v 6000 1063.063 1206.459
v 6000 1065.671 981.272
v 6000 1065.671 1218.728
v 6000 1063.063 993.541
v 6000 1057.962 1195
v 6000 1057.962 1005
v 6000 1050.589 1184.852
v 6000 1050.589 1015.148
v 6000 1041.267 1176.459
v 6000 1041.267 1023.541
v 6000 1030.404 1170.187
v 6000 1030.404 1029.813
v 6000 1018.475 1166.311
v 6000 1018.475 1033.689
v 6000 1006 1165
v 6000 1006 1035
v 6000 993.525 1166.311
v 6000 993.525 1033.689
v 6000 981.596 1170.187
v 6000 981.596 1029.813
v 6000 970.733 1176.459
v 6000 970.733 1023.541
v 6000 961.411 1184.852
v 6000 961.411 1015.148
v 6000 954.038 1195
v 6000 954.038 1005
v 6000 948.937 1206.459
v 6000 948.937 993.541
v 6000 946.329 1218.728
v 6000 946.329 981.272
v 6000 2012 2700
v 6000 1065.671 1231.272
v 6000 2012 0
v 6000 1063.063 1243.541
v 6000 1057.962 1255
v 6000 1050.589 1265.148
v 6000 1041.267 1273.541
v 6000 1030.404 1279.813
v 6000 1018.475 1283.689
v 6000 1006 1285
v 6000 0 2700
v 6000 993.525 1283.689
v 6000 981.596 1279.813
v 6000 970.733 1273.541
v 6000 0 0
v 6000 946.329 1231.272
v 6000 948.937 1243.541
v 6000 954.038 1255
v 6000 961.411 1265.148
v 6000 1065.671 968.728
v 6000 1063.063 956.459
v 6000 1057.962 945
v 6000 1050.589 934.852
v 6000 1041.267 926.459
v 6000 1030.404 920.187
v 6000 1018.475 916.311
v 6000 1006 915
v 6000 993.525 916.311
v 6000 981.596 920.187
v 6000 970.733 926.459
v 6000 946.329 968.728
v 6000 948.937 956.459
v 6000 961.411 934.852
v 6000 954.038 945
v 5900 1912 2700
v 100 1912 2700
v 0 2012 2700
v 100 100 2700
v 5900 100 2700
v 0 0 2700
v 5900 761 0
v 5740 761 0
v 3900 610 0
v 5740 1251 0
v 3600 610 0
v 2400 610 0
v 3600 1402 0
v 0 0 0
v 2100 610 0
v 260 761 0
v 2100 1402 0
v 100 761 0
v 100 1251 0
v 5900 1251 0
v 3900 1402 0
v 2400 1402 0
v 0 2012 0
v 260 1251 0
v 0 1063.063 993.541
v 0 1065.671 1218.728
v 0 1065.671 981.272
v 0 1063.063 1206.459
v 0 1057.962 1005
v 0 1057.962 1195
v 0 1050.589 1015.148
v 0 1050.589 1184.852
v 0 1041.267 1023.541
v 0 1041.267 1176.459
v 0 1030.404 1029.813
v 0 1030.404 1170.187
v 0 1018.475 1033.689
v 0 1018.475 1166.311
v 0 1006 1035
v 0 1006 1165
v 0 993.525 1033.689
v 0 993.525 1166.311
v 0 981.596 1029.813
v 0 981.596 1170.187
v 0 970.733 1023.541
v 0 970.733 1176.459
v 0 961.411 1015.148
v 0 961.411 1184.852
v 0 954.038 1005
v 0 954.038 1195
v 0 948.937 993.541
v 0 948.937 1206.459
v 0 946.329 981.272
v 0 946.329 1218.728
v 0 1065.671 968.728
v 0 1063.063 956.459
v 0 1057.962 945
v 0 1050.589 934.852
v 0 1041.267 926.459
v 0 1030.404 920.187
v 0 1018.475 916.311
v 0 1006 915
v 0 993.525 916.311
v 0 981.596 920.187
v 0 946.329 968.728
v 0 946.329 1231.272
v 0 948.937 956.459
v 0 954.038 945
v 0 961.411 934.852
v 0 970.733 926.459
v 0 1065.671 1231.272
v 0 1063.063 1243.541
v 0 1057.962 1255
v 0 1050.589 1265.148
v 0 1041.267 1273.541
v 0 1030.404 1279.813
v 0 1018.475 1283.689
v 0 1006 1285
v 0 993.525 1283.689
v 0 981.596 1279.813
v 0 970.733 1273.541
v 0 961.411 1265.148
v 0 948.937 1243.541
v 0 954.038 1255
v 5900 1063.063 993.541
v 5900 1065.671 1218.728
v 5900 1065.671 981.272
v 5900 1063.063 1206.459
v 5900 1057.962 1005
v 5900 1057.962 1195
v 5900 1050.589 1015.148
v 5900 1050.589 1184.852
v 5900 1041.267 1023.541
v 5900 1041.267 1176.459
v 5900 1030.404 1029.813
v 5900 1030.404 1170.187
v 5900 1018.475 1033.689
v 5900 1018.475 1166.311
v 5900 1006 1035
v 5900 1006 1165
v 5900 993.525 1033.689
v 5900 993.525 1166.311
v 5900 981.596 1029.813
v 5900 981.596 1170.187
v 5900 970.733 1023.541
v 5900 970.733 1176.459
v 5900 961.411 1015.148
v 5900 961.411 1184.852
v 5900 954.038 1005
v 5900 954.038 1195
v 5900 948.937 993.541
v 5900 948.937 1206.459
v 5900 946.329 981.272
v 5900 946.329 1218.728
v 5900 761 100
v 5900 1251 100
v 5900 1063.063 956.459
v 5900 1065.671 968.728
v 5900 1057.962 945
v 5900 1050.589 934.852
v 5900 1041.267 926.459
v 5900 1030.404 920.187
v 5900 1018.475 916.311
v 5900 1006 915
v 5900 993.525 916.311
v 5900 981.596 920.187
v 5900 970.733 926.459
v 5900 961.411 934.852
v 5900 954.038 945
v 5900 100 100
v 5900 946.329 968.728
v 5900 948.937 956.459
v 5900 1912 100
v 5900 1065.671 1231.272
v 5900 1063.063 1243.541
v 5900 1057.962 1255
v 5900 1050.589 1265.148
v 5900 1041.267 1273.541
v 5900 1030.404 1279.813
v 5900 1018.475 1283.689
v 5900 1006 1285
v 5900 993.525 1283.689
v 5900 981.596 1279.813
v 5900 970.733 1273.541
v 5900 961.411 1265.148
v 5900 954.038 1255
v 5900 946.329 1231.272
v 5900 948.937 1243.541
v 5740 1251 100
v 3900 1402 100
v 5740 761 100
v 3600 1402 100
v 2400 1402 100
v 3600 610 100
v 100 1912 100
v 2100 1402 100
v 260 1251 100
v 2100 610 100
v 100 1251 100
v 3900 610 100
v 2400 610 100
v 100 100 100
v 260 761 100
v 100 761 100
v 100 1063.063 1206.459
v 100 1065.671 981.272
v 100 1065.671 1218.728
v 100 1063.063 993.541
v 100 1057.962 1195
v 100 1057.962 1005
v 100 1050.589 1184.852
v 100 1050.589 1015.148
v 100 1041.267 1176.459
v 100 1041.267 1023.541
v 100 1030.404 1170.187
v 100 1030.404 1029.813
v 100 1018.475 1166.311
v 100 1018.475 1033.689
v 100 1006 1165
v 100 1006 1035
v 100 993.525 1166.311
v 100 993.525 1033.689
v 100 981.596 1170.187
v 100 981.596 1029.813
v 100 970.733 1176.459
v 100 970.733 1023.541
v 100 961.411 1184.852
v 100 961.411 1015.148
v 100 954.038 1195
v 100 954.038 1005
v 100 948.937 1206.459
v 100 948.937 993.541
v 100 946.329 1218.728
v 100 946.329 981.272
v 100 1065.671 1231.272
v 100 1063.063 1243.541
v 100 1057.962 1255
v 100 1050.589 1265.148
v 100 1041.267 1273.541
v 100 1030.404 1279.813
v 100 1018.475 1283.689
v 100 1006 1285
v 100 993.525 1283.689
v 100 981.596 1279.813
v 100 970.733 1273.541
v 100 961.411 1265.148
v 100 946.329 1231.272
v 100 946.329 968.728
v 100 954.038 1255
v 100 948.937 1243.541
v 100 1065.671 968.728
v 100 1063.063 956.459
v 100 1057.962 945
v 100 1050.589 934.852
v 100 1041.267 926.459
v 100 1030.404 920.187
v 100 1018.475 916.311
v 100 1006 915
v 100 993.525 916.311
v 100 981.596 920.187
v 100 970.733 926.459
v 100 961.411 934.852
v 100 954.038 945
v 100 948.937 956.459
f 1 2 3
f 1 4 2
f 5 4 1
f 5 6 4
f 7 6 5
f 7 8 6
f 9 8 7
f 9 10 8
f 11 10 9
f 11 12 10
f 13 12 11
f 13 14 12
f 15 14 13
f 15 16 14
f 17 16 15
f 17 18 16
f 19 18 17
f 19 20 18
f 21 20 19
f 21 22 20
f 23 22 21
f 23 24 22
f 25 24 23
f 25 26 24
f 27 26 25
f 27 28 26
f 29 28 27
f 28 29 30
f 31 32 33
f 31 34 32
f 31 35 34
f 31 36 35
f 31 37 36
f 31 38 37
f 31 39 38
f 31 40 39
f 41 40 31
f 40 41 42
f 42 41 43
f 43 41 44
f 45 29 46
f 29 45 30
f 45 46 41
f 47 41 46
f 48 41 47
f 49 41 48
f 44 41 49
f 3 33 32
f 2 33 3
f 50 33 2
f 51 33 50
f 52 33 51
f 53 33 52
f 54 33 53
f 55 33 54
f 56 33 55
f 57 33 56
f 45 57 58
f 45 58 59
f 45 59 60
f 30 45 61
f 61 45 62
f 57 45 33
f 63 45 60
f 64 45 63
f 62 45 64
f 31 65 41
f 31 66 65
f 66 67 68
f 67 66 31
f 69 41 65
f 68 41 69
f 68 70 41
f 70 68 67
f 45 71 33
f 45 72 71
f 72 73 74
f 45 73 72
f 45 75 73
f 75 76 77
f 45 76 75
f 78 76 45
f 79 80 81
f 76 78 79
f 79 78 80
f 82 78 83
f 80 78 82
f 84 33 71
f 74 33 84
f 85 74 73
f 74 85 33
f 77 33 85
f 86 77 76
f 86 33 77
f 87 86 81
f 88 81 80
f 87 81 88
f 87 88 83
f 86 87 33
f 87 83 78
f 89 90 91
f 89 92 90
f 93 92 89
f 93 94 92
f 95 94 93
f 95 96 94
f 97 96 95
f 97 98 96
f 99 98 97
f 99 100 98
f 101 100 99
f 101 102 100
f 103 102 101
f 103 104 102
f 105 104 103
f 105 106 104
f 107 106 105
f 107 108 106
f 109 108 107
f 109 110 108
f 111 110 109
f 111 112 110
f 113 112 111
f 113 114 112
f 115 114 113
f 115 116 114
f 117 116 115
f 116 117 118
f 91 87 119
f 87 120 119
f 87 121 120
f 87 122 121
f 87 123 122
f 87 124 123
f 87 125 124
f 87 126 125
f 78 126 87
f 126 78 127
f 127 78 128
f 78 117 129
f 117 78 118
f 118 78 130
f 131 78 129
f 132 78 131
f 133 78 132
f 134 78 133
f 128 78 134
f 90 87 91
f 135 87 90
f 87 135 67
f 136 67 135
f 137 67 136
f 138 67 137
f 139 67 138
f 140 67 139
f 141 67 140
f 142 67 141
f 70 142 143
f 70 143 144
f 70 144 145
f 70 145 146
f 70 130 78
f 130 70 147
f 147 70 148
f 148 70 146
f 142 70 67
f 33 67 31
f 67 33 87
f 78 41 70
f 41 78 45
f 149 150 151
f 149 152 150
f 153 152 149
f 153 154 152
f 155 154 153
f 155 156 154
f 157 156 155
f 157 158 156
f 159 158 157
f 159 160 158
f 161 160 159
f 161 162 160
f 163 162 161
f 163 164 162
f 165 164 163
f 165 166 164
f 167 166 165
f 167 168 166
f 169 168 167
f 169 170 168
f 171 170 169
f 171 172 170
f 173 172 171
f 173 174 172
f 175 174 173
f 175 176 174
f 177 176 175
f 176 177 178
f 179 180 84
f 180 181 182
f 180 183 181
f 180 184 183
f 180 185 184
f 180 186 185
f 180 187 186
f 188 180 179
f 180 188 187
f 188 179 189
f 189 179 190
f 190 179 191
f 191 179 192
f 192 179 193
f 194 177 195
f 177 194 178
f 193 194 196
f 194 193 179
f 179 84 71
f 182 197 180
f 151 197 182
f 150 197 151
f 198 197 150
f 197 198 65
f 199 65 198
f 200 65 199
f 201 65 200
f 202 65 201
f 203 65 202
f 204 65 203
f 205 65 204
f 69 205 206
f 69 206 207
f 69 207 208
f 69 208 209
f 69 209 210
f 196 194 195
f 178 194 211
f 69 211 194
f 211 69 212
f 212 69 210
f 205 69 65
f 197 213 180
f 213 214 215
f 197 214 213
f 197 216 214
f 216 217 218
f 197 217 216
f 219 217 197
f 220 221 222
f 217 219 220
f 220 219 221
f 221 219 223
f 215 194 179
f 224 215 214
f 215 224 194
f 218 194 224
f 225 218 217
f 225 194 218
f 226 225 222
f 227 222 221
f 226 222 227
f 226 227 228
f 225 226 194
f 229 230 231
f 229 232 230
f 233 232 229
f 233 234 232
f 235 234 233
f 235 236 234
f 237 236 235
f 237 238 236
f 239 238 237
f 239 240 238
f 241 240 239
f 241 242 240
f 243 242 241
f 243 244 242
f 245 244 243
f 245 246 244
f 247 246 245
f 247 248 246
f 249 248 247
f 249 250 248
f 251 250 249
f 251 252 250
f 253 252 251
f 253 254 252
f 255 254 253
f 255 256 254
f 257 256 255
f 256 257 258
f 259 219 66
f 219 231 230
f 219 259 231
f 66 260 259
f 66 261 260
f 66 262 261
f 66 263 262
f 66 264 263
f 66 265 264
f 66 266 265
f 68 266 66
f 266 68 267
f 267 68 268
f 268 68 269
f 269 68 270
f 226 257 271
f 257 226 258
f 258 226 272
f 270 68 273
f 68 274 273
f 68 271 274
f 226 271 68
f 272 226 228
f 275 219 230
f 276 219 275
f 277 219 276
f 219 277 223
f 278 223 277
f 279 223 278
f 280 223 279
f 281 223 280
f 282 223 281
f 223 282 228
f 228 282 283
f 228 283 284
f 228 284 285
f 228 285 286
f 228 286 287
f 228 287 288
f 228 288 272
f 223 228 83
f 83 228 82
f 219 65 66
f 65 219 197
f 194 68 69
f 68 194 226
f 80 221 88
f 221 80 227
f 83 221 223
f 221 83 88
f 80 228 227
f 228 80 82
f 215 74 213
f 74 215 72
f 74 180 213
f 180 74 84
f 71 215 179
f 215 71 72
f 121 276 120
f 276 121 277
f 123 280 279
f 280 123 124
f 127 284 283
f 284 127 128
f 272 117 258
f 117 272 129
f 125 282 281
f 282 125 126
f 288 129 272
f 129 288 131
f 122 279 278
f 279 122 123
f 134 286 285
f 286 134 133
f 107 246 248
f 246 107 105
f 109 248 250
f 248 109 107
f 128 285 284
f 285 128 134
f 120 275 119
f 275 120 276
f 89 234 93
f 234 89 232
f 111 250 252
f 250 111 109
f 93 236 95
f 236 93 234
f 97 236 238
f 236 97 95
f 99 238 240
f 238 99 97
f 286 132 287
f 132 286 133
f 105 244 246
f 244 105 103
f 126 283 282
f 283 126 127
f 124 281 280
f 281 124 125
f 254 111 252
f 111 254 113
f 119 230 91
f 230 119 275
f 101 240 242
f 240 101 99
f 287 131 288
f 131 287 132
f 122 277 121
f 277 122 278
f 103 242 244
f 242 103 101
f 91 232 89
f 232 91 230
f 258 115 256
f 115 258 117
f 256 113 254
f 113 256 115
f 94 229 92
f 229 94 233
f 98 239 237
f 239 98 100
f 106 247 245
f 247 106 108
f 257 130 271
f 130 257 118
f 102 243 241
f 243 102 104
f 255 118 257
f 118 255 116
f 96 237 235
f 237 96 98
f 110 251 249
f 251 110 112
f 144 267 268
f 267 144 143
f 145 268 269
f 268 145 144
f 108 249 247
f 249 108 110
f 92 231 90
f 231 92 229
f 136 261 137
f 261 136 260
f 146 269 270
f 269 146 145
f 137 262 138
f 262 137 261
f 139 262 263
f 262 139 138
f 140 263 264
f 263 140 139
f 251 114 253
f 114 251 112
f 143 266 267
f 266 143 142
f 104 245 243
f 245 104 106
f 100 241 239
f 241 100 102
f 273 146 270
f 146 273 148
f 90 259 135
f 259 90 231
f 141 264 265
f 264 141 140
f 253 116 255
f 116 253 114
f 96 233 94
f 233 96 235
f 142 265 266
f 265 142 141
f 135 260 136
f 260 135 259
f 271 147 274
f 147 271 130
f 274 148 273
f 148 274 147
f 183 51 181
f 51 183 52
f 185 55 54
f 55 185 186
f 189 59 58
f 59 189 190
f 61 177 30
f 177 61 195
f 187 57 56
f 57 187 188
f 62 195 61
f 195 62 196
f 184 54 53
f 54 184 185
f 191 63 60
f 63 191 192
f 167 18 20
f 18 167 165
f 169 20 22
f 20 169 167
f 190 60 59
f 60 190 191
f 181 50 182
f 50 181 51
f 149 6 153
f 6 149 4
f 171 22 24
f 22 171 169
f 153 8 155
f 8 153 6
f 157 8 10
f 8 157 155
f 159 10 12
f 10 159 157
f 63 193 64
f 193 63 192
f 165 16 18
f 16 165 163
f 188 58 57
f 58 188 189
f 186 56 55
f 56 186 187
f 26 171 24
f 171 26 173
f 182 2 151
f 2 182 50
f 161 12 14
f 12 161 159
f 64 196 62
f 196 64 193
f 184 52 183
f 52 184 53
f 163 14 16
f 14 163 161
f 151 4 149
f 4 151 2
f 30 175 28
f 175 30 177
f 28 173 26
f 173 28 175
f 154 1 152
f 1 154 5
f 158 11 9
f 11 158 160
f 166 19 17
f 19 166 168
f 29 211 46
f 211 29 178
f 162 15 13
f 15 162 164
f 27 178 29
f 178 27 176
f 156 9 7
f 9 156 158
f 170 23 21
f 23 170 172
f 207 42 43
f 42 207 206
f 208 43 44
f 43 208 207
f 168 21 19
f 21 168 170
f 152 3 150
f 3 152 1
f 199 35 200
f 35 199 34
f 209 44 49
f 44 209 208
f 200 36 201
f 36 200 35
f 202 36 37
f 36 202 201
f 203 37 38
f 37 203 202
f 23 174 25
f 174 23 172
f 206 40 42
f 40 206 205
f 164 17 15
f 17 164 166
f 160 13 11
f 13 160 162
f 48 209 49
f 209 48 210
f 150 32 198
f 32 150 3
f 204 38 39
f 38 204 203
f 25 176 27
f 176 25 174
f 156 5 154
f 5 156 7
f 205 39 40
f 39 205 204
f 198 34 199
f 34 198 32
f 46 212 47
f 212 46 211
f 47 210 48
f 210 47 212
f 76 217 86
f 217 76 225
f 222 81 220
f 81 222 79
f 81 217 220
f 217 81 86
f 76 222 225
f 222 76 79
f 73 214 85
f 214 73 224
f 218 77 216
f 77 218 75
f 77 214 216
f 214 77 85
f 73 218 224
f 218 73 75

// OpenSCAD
module tummy()
{
  crack = 490;
  width = 761;
  side1 = 6000;
  side2 = width*2 + crack;
  side3 = 2700;
  thck = 100;      //1mm plastic thickness
  hole_dist=250; // distance between holes on sides layer
  hole_r=60;     //radius of metal-wire hole 
  servo_arm_thck = 160;
  cable_crack_x = 300;
  cable_crack_y = 792;
 
  difference() {	
    cube([side1,side2,side3]); //global cube
    translate([thck,thck,thck]) cube([side1-(thck*2), side2-(thck*2), side3-(thck*2)]); // remove all inside
    translate([thck,thck,side3-thck]) cube([side1-(thck*2), side2-(thck*2), thck]); //remove one wall
    translate([thck, side2/2 - crack/2, 0]) cube([160, crack, thck]); // left servo arm hole
    translate([side1-thck-servo_arm_thck, side2/2 - crack/2, 0]) cube([servo_arm_thck, crack, thck]); // right servo arm hole
    rotate([0, 90, 0]) translate([-(side3/2 -1.5*hole_dist), side2/2, 0]) 
    cylinder(h=thck+1, r=hole_r); //wire bottom hole
   rotate([0, 90, 0]) translate([-(side3/2 -0.5*hole_dist), side2/2, 0]) 
    cylinder(h=thck+1, r=hole_r); //wire top hole
  rotate([0, 90, 0]) translate([-(side3/2 -1.5*hole_dist), side2/2, side1-thck]) 
    cylinder(h=thck+1, r=hole_r); //wire bottom hole
  rotate([0, 90, 0]) translate([-(side3/2 -0.5*hole_dist), side2/2, side1-thck]) 
    cylinder(h=thck+1, r=hole_r); //wire top hole

    translate([side3-300-cable_crack_x, side2/2 - cable_crack_y/2, 0]) cube([cable_crack_x, cable_crack_y, thck]);
    translate([side1-(side3-300), side2/2 - cable_crack_y/2, 0]) cube([cable_crack_x, cable_crack_y, thck]);
  }
}

tummy();
